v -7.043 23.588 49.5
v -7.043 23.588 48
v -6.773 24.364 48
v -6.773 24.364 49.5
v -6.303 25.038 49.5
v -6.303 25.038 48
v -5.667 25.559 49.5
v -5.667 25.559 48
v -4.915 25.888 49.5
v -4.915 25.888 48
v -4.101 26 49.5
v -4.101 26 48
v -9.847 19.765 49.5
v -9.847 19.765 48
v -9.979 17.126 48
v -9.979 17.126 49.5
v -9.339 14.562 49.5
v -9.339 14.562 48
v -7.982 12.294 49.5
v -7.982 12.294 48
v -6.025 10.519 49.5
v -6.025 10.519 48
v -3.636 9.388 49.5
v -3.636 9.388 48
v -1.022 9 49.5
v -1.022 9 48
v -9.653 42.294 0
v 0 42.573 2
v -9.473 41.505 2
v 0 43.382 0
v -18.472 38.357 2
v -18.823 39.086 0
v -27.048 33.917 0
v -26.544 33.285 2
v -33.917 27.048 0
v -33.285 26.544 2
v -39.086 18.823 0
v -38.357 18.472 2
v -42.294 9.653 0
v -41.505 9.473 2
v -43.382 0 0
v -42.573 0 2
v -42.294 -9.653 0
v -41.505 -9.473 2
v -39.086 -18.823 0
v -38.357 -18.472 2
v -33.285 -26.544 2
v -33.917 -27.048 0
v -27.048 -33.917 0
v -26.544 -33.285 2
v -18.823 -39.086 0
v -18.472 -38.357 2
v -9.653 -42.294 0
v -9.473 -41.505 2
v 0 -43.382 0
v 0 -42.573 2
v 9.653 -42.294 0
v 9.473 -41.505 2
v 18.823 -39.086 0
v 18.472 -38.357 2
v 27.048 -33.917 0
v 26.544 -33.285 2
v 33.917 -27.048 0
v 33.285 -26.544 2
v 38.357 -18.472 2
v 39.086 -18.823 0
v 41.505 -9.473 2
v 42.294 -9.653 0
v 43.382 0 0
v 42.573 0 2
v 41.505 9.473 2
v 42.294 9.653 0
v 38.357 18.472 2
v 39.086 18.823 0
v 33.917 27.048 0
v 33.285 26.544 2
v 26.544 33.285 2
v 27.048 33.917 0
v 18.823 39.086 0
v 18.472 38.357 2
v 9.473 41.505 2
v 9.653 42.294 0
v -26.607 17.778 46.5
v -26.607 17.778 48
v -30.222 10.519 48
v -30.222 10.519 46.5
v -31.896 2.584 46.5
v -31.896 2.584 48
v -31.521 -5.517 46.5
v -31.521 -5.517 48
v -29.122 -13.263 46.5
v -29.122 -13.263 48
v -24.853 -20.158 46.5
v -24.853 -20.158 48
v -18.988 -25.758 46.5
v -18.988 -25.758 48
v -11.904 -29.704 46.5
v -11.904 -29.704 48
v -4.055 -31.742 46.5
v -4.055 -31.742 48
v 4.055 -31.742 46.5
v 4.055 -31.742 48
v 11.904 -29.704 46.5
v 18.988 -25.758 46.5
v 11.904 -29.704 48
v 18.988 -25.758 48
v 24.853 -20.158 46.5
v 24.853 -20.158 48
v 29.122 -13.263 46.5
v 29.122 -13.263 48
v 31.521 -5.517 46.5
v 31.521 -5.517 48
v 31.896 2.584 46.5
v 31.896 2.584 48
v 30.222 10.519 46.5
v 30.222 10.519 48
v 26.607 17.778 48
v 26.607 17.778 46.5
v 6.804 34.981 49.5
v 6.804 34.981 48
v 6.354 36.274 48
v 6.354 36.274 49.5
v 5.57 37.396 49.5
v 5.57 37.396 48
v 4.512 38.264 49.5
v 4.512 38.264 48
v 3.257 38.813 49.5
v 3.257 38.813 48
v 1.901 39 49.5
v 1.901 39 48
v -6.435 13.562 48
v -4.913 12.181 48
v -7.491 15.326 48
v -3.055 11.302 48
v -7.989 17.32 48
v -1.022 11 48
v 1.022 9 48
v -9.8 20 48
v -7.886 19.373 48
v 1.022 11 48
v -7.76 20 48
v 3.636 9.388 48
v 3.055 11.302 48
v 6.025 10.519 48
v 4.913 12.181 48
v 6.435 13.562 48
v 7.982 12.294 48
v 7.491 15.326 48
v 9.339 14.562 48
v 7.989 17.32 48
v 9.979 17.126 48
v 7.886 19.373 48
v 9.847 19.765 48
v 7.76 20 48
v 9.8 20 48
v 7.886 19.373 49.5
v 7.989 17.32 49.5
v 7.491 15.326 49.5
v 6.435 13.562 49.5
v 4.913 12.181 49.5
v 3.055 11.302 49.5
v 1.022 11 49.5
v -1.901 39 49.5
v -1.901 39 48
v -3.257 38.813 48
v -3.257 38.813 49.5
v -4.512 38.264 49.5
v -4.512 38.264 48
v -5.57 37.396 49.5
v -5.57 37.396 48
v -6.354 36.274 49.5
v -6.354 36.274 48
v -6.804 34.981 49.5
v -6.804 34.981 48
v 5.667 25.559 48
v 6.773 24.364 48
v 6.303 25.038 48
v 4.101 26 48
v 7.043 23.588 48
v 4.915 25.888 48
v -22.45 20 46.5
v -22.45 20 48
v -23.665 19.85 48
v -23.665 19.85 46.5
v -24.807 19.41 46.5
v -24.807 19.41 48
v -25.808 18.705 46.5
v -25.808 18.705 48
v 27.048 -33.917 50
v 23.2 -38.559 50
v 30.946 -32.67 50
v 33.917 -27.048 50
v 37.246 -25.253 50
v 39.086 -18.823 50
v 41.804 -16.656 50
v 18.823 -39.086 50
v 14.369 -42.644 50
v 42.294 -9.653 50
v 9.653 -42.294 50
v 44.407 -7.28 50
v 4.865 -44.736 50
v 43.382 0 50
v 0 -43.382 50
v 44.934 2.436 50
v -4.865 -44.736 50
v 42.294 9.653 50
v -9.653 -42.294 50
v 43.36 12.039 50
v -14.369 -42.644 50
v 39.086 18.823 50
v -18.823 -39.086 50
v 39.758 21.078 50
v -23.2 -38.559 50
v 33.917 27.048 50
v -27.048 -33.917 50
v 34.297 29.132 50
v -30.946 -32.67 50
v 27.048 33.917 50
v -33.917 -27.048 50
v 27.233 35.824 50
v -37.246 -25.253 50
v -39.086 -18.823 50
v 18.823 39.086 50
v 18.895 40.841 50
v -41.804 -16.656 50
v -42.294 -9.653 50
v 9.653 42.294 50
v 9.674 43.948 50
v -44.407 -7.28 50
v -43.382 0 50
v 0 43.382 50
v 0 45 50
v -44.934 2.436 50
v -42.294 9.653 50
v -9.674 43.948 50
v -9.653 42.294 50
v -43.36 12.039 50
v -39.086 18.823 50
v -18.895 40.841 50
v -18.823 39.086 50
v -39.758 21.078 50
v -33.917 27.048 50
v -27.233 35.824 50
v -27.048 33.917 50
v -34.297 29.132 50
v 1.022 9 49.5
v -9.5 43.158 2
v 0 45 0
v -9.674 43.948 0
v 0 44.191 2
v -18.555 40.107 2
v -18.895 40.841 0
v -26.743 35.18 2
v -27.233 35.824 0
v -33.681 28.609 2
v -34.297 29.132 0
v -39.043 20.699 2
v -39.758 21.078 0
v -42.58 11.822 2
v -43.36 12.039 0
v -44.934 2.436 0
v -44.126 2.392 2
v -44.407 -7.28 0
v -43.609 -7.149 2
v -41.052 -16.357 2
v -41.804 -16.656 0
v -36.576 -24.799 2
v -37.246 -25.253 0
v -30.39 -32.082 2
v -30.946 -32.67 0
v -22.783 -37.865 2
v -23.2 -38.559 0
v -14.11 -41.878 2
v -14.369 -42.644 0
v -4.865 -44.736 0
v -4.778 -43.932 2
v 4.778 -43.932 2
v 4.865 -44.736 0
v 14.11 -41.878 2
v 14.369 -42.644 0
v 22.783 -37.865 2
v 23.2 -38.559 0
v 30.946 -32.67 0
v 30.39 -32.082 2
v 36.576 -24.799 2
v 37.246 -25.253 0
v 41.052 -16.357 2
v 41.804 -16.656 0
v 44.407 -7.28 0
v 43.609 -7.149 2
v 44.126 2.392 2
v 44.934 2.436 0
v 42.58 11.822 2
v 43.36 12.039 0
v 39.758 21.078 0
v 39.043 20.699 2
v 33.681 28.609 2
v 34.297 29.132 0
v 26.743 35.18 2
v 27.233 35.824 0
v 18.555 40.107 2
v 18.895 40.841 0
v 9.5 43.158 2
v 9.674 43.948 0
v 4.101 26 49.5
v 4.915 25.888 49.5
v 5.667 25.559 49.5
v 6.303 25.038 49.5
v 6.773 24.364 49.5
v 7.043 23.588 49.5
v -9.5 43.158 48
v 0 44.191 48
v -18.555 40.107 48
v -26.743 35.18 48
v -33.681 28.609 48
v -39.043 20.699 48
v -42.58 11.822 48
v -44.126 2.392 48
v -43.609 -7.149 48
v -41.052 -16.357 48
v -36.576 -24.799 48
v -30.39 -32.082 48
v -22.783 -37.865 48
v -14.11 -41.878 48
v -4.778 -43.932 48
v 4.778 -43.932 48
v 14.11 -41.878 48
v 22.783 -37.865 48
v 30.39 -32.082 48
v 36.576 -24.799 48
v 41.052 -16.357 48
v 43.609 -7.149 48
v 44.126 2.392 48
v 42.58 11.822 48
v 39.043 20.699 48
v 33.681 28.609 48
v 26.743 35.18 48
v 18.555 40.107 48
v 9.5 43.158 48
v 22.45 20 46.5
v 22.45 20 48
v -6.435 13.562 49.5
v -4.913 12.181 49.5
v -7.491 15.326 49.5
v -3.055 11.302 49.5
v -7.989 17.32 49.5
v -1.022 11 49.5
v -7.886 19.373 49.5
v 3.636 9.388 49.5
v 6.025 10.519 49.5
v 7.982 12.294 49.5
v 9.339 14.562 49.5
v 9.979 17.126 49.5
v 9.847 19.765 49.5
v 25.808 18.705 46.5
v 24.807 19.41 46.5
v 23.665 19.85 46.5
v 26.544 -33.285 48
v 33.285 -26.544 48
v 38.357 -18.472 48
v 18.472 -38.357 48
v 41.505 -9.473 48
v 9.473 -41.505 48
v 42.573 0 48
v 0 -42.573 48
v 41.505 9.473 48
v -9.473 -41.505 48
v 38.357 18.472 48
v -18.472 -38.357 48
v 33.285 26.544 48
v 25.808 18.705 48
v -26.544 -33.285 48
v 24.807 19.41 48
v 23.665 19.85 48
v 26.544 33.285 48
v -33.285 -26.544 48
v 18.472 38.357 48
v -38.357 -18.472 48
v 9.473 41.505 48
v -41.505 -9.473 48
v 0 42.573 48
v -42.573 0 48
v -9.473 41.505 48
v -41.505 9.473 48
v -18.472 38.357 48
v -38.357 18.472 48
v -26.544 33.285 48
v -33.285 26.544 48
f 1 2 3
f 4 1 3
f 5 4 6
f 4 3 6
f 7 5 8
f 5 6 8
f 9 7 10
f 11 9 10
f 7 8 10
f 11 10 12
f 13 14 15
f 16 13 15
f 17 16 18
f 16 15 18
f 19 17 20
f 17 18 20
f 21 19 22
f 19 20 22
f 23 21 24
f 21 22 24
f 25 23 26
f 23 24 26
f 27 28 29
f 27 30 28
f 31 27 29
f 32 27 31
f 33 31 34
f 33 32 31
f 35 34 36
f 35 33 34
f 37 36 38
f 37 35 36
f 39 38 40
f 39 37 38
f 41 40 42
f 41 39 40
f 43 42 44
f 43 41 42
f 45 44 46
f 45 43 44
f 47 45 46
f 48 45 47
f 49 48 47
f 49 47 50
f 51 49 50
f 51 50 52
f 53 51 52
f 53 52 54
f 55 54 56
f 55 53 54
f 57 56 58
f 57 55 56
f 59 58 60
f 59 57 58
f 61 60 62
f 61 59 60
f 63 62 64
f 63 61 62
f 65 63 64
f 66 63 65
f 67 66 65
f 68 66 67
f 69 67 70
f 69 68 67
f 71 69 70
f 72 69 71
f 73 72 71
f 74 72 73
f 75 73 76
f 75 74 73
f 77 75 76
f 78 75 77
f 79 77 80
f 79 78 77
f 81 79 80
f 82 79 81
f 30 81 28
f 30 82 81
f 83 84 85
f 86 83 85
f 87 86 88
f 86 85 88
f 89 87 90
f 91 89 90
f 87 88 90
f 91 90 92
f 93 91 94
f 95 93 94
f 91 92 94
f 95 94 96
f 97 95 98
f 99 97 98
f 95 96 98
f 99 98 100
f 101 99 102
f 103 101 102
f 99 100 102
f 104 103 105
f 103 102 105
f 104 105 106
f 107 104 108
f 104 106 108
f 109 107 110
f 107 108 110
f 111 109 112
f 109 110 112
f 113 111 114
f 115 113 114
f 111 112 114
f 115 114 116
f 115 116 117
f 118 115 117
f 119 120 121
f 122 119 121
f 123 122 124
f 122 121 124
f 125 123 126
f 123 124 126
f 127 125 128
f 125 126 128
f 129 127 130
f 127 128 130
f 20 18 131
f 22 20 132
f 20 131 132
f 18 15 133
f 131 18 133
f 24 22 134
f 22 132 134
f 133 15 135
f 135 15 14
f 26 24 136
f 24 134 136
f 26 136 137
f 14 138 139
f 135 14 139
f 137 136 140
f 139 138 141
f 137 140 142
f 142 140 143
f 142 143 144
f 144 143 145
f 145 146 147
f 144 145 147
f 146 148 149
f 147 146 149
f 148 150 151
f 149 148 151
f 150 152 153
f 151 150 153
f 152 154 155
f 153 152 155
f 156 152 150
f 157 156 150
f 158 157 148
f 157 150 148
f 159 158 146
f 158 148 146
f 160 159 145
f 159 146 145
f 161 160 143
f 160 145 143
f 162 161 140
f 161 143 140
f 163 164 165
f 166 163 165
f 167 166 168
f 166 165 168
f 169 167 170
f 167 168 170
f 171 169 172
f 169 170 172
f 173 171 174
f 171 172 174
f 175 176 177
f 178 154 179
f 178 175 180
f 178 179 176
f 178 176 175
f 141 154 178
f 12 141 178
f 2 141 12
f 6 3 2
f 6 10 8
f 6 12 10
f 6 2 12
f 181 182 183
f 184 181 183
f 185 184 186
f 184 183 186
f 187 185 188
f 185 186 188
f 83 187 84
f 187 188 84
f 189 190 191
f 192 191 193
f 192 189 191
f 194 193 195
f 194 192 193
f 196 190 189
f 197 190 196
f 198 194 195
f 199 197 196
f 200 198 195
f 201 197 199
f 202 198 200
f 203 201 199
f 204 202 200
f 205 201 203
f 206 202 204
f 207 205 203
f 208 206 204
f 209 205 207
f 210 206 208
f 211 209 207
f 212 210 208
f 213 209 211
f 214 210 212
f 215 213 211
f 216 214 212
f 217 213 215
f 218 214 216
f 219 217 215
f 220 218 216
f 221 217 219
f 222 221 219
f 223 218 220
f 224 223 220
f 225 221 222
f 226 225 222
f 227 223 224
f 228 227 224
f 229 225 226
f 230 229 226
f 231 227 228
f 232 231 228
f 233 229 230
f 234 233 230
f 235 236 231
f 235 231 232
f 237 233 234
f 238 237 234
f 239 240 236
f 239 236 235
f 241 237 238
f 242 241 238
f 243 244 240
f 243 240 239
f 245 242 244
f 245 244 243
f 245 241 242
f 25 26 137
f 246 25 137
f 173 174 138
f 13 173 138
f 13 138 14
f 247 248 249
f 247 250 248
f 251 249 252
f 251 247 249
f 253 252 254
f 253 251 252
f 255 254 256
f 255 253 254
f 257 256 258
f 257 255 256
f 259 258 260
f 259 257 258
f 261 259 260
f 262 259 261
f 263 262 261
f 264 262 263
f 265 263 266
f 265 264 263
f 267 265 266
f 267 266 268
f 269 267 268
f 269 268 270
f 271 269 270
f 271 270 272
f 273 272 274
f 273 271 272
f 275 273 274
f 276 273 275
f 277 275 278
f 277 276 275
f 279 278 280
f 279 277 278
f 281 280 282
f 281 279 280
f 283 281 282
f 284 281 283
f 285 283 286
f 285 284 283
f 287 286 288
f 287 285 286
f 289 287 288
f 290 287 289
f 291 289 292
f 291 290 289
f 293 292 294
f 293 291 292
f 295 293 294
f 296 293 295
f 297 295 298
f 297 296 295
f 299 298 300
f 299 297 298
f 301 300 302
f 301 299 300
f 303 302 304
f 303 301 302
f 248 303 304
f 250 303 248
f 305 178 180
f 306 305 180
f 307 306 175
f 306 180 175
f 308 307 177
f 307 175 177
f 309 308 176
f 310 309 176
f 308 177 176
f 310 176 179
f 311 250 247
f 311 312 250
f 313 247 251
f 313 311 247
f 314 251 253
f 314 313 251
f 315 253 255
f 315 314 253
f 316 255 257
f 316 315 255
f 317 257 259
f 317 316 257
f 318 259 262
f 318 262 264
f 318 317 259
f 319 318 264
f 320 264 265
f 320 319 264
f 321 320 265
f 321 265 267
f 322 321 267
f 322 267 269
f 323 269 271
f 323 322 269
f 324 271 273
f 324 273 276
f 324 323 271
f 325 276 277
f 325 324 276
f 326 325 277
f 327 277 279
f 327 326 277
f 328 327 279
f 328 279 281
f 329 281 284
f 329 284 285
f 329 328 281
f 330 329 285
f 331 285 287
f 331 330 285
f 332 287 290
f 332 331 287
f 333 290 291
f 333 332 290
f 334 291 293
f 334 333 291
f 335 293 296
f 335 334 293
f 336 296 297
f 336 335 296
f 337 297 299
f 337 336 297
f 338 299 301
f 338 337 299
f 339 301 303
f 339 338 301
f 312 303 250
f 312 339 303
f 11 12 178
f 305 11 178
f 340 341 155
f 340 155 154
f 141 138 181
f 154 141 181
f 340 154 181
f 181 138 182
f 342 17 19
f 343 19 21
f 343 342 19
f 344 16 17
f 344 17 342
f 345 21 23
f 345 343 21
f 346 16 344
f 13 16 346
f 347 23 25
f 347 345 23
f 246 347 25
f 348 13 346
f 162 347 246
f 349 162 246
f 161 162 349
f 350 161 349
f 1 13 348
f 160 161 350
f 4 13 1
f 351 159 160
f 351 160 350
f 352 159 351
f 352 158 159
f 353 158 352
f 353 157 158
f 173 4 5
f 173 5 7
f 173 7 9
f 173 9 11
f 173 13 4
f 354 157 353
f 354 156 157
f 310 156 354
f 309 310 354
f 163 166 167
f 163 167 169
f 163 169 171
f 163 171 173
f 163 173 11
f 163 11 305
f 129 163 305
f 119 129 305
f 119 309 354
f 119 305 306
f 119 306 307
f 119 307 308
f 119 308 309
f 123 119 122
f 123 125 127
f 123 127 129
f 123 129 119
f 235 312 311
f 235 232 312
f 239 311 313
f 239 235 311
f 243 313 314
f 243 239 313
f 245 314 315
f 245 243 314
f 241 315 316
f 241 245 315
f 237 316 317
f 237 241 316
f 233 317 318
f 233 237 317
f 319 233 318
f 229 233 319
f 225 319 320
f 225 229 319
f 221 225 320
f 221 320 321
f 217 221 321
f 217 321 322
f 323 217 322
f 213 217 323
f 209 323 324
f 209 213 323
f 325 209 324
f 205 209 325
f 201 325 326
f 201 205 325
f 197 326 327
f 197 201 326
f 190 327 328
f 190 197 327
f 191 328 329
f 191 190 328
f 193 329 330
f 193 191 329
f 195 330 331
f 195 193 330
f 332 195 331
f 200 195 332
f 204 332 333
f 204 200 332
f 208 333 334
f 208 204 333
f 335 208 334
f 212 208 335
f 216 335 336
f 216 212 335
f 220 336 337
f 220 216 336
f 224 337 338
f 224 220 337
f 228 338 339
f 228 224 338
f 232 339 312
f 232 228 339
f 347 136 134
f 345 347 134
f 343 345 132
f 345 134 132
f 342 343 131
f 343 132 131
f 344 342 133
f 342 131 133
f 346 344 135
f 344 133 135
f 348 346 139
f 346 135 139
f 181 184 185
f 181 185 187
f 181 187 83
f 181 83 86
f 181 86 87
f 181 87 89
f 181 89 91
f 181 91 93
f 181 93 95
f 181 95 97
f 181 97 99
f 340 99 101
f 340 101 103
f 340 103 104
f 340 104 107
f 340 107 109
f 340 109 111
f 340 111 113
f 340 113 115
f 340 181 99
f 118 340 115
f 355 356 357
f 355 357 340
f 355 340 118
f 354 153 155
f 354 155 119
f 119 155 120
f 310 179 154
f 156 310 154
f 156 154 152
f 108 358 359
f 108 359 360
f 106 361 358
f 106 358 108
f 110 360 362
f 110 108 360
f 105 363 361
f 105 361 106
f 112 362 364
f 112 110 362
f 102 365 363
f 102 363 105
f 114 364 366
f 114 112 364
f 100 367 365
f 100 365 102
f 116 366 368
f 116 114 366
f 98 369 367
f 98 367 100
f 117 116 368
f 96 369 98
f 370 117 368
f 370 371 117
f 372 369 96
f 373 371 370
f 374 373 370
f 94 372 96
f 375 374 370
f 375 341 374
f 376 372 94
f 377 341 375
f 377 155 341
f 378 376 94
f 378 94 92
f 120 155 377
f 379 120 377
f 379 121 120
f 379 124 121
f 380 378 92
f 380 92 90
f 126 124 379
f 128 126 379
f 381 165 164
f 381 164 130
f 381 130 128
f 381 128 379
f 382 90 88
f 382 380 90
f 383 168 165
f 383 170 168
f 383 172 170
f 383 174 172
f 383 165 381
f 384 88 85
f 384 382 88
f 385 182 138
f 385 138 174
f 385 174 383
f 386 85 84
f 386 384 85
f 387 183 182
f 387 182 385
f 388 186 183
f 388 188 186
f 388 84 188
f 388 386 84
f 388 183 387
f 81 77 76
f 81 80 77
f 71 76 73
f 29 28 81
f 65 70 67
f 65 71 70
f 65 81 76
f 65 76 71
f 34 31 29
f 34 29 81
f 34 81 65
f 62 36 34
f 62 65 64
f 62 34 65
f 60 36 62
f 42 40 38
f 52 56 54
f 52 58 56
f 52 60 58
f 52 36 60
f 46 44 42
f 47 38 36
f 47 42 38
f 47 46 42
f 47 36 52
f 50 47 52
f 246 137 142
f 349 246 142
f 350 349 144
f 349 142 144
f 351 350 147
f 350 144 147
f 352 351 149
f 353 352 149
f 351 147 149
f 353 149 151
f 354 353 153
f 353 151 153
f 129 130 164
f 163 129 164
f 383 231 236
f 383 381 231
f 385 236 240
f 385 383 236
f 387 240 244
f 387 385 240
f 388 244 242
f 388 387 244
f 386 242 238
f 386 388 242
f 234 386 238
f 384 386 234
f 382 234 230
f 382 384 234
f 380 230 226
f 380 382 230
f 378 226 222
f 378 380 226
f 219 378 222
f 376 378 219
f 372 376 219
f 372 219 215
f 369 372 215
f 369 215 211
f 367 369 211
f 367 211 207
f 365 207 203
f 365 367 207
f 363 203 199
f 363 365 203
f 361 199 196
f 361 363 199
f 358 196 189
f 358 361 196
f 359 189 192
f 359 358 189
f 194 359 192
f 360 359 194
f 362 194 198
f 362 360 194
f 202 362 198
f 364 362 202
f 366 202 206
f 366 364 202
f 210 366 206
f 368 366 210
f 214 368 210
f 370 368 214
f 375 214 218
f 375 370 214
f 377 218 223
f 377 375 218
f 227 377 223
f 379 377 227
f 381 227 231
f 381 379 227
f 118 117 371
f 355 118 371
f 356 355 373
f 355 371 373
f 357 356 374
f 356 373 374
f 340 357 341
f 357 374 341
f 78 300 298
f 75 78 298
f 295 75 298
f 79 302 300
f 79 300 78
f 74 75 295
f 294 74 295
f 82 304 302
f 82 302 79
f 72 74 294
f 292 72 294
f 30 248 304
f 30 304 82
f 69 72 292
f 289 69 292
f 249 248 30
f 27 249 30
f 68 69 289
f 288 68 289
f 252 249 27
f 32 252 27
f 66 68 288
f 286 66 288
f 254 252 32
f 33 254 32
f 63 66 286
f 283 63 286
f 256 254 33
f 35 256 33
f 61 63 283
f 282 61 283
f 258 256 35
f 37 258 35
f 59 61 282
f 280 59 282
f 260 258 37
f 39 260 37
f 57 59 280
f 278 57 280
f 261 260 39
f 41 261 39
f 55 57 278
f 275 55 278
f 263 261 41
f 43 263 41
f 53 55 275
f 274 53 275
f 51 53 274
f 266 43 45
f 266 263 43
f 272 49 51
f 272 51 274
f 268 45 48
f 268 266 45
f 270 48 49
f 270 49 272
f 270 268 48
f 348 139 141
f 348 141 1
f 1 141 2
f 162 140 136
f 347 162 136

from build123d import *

# Parameters (mm, degrees)
F3_DEPTH = 1.5
F5_DEPTH = 1.5


with BuildPart() as f1:
    # F0 (on Right) → F1 (revolve)
    with BuildSketch(Plane.YZ):
        Polygon((0, 48), (0, 2), (42.57288, 2), (43.38192, 0), (45, 0), (44.19096, 2), (44.19096, 48), (45, 50), (43.38192, 50), (42.57288, 48), align=None)
    revolve(axis=Axis((0, 0, 25), (0, 0, 1)))

    # F2 (on face) → F3 (cut)
    with BuildSketch(Plane.XY.offset(48)):
        with BuildLine():
            ThreePointArc((-22.449944, 20), (-24.806967, 19.409586), (-26.607341, 17.777778))
            ThreePointArc((-26.607341, 17.777778), (0, -32), (26.607341, 17.777778))
            ThreePointArc((26.607341, 17.777778), (24.806967, 19.409586), (22.449944, 20))
            Line((22.449944, 20), (-22.449944, 20))
        make_face()
    extrude(amount=-F3_DEPTH, mode=Mode.SUBTRACT)

    # F4 (on face) → F5 (join)
    with BuildSketch(Plane.XY.offset(48)):
        with BuildLine():
            Line((1.90098, 39), (-1.90098, 39))
            ThreePointArc((-1.90098, 39), (-5.070925, 37.866711), (-6.803884, 34.980581))
            Line((-6.803884, 34.980581), (-9.846991, 19.765045))
            ThreePointArc((-9.846991, 19.765045), (-7.981844, 12.2941), (-1.021765, 9))
            Line((-1.021765, 9), (1.021765, 9))
            ThreePointArc((1.021765, 9), (7.981844, 12.2941), (9.846991, 19.765045))
            Line((9.846991, 19.765045), (6.803884, 34.980581))
            ThreePointArc((6.803884, 34.980581), (5.070925, 37.866711), (1.90098, 39))
        make_face()
        with BuildLine():
            ThreePointArc((7.88583, 19.372813), (6.43516, 13.562078), (1.021765, 11))
            Line((1.021765, 11), (-1.021765, 11))
            ThreePointArc((-1.021765, 11), (-6.43516, 13.562078), (-7.88583, 19.372813))
            Line((-7.88583, 19.372813), (-7.042723, 23.588348))
            ThreePointArc((-7.042723, 23.588348), (-6.002947, 25.320026), (-4.10098, 26))
            Line((-4.10098, 26), (4.10098, 26))
            ThreePointArc((4.10098, 26), (6.002947, 25.320026), (7.042723, 23.588348))
            Line((7.042723, 23.588348), (7.88583, 19.372813))
        make_face(mode=Mode.SUBTRACT)
    extrude(amount=F5_DEPTH)


solid = f1.part
